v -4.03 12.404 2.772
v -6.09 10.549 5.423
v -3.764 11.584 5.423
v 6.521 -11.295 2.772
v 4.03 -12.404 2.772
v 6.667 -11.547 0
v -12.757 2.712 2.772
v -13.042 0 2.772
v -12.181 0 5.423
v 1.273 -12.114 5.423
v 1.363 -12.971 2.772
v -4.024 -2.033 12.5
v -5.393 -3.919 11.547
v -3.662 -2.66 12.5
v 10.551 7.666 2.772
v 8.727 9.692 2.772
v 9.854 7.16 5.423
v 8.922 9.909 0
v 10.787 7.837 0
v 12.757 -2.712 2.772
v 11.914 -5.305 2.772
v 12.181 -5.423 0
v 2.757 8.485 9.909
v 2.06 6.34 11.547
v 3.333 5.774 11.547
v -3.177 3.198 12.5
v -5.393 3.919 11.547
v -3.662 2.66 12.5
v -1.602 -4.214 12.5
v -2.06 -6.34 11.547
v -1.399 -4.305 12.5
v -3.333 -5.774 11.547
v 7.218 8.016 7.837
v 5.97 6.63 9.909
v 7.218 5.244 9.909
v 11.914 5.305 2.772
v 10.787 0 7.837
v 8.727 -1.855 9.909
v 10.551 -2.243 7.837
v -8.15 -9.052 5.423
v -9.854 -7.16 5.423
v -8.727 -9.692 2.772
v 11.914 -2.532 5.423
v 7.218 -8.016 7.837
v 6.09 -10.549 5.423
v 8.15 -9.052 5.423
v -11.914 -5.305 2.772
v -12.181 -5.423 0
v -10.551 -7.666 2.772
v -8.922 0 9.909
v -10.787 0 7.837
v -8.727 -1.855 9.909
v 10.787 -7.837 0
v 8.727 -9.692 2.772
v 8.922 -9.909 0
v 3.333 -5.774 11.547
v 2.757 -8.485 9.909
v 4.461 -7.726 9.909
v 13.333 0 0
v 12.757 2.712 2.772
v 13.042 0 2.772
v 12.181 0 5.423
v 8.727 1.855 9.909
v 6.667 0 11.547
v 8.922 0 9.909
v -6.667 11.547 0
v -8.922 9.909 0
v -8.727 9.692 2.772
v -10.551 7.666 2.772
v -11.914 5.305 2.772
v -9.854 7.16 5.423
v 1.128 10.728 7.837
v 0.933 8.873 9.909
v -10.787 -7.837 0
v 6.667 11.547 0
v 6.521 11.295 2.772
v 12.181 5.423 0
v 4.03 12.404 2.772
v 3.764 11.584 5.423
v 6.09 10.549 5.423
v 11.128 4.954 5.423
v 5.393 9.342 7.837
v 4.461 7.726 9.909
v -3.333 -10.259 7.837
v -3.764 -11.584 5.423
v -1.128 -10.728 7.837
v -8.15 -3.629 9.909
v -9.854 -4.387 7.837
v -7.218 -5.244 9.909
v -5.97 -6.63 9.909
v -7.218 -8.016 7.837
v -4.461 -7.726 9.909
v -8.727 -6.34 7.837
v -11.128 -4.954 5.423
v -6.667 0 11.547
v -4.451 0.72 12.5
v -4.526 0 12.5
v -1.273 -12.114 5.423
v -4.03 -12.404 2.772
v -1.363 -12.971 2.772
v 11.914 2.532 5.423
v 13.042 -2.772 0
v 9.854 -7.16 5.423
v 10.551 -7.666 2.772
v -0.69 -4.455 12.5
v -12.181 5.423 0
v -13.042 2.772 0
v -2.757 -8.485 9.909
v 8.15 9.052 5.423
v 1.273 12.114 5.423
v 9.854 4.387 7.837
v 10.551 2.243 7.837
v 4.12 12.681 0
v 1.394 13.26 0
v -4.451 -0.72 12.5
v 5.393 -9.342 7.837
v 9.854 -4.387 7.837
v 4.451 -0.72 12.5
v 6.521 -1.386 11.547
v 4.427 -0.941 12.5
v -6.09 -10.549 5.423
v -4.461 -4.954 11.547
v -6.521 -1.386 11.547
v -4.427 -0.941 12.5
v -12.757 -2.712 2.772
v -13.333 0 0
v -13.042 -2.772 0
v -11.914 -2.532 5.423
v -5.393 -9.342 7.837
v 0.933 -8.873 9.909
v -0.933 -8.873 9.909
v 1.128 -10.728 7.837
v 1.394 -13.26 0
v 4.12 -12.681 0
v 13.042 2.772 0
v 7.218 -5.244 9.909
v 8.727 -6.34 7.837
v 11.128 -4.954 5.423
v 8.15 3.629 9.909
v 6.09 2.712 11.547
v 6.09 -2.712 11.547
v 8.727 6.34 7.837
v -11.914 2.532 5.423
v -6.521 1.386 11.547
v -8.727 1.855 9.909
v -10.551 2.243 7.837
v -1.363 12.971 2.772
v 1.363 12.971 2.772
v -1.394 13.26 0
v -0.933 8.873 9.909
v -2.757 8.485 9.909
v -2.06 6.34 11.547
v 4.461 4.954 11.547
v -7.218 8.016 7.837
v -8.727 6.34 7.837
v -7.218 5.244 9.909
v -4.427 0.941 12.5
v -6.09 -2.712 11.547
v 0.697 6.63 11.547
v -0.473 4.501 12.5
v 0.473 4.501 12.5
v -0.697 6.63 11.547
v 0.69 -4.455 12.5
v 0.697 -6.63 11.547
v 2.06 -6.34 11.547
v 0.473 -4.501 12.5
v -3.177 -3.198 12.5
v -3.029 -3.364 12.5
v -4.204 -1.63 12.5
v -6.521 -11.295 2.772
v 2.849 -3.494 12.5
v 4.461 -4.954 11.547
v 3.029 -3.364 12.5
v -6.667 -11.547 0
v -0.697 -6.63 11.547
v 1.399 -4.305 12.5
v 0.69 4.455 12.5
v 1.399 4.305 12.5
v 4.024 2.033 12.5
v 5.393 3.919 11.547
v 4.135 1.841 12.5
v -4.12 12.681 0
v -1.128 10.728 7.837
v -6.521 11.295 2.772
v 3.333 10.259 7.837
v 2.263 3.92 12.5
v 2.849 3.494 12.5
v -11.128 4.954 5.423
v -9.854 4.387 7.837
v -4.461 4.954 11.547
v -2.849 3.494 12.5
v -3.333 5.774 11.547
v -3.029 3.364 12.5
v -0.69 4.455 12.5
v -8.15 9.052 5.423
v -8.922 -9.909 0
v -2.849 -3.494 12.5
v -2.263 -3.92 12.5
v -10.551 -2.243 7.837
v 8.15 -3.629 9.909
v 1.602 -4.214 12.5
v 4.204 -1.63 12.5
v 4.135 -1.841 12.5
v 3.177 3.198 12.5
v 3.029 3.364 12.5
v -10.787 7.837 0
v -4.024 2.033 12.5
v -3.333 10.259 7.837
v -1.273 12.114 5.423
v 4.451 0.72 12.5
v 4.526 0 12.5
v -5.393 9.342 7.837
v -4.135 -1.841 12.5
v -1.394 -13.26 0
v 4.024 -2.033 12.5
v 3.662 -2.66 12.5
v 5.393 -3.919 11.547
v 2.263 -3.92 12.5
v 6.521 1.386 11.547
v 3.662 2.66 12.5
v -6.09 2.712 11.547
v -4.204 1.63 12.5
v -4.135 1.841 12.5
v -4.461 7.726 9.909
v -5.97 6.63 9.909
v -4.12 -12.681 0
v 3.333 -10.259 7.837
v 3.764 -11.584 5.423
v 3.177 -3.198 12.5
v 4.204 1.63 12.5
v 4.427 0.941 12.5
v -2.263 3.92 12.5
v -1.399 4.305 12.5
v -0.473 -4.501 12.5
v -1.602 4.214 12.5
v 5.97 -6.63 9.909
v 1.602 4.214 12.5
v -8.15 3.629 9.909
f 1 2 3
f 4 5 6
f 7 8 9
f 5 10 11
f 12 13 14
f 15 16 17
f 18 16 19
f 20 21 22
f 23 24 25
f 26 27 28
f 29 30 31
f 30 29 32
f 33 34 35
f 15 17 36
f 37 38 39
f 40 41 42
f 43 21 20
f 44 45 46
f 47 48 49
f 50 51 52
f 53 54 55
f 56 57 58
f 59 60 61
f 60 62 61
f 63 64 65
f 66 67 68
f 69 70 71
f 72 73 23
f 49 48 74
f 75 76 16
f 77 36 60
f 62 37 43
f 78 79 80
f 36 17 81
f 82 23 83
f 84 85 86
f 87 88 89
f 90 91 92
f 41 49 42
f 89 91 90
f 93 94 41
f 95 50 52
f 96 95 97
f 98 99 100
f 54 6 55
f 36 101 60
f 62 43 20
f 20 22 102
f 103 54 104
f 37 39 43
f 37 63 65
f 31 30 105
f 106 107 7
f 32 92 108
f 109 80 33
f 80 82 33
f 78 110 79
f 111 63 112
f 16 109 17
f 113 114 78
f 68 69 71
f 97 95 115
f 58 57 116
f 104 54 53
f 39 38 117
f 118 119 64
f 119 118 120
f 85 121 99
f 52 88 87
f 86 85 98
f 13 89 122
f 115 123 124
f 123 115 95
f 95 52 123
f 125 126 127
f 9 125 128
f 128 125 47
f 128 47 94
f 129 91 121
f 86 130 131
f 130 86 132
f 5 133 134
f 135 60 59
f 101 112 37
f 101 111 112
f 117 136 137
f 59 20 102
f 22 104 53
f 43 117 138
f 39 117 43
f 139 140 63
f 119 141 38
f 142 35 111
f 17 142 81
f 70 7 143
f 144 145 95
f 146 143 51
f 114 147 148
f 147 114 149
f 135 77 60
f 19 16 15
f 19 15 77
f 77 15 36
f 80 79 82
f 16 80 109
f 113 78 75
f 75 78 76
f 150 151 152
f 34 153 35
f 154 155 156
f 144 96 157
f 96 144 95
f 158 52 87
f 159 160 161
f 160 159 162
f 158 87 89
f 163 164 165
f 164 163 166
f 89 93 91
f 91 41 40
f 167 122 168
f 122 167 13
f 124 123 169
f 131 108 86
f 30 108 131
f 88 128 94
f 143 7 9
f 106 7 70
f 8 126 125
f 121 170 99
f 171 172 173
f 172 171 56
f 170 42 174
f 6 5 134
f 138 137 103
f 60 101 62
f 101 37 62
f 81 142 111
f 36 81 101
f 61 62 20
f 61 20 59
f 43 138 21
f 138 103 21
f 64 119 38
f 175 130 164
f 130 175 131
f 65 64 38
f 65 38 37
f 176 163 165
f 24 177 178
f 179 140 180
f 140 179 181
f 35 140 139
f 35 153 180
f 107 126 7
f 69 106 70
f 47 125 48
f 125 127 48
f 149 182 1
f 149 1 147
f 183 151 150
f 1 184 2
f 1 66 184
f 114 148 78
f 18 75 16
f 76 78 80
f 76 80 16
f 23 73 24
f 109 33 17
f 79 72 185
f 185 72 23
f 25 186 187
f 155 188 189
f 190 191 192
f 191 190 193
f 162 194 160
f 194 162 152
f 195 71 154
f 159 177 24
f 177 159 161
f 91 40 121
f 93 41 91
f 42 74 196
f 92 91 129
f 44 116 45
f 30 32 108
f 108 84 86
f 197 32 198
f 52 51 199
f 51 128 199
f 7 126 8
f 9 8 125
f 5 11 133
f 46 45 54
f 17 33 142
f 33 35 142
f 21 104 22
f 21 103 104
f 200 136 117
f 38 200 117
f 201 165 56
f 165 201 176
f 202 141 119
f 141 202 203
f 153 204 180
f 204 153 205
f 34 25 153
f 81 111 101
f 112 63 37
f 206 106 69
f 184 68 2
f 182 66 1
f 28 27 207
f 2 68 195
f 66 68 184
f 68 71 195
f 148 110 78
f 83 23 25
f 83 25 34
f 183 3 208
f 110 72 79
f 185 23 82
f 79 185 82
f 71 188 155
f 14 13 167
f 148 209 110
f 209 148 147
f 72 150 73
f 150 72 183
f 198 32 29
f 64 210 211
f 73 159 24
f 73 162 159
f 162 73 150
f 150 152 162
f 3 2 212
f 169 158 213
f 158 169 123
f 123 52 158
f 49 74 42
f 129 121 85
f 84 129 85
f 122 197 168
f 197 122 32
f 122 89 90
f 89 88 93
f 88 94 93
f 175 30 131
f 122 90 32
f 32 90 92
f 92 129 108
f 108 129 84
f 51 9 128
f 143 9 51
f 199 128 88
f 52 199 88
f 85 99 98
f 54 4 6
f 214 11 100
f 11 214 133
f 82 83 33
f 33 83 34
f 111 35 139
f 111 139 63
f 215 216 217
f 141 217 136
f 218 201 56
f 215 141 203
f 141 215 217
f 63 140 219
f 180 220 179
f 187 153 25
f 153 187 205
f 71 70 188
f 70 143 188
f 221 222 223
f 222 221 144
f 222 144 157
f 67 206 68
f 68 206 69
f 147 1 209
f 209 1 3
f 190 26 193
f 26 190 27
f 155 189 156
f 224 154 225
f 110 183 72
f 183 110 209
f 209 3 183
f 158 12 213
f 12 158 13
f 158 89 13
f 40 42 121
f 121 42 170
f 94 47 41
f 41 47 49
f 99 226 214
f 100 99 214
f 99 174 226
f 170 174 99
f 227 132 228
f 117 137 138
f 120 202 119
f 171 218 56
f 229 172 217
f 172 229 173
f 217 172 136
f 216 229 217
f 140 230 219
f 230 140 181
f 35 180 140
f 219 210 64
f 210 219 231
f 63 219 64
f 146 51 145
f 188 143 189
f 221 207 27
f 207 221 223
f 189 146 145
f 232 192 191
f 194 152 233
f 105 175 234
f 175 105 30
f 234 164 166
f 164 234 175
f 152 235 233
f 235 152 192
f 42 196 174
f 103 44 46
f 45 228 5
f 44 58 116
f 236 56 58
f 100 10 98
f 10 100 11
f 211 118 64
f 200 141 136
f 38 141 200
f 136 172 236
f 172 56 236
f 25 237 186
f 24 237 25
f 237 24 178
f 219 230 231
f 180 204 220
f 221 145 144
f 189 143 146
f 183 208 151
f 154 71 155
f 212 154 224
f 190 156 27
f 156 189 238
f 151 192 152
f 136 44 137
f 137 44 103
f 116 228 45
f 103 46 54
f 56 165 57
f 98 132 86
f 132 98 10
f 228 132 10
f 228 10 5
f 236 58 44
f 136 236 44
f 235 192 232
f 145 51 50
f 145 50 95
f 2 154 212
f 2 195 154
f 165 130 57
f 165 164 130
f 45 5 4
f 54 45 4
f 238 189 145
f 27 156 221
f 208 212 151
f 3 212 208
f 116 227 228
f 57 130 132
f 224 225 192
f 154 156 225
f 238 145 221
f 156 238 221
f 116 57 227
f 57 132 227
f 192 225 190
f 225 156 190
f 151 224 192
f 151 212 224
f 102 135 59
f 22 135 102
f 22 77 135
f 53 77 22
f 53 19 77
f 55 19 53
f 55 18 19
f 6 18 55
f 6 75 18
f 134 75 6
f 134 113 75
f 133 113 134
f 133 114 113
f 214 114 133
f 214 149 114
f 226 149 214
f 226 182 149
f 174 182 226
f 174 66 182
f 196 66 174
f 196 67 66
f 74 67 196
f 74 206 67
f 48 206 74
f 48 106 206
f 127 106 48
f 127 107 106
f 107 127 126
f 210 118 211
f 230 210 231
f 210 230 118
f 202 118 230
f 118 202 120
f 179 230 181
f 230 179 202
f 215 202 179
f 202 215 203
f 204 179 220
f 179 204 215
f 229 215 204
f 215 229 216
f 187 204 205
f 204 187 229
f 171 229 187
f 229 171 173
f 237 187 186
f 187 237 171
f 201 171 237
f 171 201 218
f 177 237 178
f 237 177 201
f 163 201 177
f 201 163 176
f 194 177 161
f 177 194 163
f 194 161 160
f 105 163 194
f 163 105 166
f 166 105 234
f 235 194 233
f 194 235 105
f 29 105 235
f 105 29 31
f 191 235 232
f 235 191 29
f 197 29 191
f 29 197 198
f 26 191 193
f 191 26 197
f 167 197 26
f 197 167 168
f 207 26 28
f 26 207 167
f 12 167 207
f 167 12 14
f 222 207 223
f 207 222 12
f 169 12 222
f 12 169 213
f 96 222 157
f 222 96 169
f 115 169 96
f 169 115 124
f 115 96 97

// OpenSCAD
///hold the old mouse board
// hold the wheel up and level
baseR=40;
vcrheadR=30.5;
vcrHight=25;


difference()
{
//scale([3,2,1]) 
sphere(r=baseR/3);
translate([0, 0,baseR/-2]) {
    cube([baseR*2,baseR*2,baseR],center= true);
}
translate([0, 0,vcrHight]) {
cylinder(r=vcrheadR, h=vcrHight, center=true);
}
}   
